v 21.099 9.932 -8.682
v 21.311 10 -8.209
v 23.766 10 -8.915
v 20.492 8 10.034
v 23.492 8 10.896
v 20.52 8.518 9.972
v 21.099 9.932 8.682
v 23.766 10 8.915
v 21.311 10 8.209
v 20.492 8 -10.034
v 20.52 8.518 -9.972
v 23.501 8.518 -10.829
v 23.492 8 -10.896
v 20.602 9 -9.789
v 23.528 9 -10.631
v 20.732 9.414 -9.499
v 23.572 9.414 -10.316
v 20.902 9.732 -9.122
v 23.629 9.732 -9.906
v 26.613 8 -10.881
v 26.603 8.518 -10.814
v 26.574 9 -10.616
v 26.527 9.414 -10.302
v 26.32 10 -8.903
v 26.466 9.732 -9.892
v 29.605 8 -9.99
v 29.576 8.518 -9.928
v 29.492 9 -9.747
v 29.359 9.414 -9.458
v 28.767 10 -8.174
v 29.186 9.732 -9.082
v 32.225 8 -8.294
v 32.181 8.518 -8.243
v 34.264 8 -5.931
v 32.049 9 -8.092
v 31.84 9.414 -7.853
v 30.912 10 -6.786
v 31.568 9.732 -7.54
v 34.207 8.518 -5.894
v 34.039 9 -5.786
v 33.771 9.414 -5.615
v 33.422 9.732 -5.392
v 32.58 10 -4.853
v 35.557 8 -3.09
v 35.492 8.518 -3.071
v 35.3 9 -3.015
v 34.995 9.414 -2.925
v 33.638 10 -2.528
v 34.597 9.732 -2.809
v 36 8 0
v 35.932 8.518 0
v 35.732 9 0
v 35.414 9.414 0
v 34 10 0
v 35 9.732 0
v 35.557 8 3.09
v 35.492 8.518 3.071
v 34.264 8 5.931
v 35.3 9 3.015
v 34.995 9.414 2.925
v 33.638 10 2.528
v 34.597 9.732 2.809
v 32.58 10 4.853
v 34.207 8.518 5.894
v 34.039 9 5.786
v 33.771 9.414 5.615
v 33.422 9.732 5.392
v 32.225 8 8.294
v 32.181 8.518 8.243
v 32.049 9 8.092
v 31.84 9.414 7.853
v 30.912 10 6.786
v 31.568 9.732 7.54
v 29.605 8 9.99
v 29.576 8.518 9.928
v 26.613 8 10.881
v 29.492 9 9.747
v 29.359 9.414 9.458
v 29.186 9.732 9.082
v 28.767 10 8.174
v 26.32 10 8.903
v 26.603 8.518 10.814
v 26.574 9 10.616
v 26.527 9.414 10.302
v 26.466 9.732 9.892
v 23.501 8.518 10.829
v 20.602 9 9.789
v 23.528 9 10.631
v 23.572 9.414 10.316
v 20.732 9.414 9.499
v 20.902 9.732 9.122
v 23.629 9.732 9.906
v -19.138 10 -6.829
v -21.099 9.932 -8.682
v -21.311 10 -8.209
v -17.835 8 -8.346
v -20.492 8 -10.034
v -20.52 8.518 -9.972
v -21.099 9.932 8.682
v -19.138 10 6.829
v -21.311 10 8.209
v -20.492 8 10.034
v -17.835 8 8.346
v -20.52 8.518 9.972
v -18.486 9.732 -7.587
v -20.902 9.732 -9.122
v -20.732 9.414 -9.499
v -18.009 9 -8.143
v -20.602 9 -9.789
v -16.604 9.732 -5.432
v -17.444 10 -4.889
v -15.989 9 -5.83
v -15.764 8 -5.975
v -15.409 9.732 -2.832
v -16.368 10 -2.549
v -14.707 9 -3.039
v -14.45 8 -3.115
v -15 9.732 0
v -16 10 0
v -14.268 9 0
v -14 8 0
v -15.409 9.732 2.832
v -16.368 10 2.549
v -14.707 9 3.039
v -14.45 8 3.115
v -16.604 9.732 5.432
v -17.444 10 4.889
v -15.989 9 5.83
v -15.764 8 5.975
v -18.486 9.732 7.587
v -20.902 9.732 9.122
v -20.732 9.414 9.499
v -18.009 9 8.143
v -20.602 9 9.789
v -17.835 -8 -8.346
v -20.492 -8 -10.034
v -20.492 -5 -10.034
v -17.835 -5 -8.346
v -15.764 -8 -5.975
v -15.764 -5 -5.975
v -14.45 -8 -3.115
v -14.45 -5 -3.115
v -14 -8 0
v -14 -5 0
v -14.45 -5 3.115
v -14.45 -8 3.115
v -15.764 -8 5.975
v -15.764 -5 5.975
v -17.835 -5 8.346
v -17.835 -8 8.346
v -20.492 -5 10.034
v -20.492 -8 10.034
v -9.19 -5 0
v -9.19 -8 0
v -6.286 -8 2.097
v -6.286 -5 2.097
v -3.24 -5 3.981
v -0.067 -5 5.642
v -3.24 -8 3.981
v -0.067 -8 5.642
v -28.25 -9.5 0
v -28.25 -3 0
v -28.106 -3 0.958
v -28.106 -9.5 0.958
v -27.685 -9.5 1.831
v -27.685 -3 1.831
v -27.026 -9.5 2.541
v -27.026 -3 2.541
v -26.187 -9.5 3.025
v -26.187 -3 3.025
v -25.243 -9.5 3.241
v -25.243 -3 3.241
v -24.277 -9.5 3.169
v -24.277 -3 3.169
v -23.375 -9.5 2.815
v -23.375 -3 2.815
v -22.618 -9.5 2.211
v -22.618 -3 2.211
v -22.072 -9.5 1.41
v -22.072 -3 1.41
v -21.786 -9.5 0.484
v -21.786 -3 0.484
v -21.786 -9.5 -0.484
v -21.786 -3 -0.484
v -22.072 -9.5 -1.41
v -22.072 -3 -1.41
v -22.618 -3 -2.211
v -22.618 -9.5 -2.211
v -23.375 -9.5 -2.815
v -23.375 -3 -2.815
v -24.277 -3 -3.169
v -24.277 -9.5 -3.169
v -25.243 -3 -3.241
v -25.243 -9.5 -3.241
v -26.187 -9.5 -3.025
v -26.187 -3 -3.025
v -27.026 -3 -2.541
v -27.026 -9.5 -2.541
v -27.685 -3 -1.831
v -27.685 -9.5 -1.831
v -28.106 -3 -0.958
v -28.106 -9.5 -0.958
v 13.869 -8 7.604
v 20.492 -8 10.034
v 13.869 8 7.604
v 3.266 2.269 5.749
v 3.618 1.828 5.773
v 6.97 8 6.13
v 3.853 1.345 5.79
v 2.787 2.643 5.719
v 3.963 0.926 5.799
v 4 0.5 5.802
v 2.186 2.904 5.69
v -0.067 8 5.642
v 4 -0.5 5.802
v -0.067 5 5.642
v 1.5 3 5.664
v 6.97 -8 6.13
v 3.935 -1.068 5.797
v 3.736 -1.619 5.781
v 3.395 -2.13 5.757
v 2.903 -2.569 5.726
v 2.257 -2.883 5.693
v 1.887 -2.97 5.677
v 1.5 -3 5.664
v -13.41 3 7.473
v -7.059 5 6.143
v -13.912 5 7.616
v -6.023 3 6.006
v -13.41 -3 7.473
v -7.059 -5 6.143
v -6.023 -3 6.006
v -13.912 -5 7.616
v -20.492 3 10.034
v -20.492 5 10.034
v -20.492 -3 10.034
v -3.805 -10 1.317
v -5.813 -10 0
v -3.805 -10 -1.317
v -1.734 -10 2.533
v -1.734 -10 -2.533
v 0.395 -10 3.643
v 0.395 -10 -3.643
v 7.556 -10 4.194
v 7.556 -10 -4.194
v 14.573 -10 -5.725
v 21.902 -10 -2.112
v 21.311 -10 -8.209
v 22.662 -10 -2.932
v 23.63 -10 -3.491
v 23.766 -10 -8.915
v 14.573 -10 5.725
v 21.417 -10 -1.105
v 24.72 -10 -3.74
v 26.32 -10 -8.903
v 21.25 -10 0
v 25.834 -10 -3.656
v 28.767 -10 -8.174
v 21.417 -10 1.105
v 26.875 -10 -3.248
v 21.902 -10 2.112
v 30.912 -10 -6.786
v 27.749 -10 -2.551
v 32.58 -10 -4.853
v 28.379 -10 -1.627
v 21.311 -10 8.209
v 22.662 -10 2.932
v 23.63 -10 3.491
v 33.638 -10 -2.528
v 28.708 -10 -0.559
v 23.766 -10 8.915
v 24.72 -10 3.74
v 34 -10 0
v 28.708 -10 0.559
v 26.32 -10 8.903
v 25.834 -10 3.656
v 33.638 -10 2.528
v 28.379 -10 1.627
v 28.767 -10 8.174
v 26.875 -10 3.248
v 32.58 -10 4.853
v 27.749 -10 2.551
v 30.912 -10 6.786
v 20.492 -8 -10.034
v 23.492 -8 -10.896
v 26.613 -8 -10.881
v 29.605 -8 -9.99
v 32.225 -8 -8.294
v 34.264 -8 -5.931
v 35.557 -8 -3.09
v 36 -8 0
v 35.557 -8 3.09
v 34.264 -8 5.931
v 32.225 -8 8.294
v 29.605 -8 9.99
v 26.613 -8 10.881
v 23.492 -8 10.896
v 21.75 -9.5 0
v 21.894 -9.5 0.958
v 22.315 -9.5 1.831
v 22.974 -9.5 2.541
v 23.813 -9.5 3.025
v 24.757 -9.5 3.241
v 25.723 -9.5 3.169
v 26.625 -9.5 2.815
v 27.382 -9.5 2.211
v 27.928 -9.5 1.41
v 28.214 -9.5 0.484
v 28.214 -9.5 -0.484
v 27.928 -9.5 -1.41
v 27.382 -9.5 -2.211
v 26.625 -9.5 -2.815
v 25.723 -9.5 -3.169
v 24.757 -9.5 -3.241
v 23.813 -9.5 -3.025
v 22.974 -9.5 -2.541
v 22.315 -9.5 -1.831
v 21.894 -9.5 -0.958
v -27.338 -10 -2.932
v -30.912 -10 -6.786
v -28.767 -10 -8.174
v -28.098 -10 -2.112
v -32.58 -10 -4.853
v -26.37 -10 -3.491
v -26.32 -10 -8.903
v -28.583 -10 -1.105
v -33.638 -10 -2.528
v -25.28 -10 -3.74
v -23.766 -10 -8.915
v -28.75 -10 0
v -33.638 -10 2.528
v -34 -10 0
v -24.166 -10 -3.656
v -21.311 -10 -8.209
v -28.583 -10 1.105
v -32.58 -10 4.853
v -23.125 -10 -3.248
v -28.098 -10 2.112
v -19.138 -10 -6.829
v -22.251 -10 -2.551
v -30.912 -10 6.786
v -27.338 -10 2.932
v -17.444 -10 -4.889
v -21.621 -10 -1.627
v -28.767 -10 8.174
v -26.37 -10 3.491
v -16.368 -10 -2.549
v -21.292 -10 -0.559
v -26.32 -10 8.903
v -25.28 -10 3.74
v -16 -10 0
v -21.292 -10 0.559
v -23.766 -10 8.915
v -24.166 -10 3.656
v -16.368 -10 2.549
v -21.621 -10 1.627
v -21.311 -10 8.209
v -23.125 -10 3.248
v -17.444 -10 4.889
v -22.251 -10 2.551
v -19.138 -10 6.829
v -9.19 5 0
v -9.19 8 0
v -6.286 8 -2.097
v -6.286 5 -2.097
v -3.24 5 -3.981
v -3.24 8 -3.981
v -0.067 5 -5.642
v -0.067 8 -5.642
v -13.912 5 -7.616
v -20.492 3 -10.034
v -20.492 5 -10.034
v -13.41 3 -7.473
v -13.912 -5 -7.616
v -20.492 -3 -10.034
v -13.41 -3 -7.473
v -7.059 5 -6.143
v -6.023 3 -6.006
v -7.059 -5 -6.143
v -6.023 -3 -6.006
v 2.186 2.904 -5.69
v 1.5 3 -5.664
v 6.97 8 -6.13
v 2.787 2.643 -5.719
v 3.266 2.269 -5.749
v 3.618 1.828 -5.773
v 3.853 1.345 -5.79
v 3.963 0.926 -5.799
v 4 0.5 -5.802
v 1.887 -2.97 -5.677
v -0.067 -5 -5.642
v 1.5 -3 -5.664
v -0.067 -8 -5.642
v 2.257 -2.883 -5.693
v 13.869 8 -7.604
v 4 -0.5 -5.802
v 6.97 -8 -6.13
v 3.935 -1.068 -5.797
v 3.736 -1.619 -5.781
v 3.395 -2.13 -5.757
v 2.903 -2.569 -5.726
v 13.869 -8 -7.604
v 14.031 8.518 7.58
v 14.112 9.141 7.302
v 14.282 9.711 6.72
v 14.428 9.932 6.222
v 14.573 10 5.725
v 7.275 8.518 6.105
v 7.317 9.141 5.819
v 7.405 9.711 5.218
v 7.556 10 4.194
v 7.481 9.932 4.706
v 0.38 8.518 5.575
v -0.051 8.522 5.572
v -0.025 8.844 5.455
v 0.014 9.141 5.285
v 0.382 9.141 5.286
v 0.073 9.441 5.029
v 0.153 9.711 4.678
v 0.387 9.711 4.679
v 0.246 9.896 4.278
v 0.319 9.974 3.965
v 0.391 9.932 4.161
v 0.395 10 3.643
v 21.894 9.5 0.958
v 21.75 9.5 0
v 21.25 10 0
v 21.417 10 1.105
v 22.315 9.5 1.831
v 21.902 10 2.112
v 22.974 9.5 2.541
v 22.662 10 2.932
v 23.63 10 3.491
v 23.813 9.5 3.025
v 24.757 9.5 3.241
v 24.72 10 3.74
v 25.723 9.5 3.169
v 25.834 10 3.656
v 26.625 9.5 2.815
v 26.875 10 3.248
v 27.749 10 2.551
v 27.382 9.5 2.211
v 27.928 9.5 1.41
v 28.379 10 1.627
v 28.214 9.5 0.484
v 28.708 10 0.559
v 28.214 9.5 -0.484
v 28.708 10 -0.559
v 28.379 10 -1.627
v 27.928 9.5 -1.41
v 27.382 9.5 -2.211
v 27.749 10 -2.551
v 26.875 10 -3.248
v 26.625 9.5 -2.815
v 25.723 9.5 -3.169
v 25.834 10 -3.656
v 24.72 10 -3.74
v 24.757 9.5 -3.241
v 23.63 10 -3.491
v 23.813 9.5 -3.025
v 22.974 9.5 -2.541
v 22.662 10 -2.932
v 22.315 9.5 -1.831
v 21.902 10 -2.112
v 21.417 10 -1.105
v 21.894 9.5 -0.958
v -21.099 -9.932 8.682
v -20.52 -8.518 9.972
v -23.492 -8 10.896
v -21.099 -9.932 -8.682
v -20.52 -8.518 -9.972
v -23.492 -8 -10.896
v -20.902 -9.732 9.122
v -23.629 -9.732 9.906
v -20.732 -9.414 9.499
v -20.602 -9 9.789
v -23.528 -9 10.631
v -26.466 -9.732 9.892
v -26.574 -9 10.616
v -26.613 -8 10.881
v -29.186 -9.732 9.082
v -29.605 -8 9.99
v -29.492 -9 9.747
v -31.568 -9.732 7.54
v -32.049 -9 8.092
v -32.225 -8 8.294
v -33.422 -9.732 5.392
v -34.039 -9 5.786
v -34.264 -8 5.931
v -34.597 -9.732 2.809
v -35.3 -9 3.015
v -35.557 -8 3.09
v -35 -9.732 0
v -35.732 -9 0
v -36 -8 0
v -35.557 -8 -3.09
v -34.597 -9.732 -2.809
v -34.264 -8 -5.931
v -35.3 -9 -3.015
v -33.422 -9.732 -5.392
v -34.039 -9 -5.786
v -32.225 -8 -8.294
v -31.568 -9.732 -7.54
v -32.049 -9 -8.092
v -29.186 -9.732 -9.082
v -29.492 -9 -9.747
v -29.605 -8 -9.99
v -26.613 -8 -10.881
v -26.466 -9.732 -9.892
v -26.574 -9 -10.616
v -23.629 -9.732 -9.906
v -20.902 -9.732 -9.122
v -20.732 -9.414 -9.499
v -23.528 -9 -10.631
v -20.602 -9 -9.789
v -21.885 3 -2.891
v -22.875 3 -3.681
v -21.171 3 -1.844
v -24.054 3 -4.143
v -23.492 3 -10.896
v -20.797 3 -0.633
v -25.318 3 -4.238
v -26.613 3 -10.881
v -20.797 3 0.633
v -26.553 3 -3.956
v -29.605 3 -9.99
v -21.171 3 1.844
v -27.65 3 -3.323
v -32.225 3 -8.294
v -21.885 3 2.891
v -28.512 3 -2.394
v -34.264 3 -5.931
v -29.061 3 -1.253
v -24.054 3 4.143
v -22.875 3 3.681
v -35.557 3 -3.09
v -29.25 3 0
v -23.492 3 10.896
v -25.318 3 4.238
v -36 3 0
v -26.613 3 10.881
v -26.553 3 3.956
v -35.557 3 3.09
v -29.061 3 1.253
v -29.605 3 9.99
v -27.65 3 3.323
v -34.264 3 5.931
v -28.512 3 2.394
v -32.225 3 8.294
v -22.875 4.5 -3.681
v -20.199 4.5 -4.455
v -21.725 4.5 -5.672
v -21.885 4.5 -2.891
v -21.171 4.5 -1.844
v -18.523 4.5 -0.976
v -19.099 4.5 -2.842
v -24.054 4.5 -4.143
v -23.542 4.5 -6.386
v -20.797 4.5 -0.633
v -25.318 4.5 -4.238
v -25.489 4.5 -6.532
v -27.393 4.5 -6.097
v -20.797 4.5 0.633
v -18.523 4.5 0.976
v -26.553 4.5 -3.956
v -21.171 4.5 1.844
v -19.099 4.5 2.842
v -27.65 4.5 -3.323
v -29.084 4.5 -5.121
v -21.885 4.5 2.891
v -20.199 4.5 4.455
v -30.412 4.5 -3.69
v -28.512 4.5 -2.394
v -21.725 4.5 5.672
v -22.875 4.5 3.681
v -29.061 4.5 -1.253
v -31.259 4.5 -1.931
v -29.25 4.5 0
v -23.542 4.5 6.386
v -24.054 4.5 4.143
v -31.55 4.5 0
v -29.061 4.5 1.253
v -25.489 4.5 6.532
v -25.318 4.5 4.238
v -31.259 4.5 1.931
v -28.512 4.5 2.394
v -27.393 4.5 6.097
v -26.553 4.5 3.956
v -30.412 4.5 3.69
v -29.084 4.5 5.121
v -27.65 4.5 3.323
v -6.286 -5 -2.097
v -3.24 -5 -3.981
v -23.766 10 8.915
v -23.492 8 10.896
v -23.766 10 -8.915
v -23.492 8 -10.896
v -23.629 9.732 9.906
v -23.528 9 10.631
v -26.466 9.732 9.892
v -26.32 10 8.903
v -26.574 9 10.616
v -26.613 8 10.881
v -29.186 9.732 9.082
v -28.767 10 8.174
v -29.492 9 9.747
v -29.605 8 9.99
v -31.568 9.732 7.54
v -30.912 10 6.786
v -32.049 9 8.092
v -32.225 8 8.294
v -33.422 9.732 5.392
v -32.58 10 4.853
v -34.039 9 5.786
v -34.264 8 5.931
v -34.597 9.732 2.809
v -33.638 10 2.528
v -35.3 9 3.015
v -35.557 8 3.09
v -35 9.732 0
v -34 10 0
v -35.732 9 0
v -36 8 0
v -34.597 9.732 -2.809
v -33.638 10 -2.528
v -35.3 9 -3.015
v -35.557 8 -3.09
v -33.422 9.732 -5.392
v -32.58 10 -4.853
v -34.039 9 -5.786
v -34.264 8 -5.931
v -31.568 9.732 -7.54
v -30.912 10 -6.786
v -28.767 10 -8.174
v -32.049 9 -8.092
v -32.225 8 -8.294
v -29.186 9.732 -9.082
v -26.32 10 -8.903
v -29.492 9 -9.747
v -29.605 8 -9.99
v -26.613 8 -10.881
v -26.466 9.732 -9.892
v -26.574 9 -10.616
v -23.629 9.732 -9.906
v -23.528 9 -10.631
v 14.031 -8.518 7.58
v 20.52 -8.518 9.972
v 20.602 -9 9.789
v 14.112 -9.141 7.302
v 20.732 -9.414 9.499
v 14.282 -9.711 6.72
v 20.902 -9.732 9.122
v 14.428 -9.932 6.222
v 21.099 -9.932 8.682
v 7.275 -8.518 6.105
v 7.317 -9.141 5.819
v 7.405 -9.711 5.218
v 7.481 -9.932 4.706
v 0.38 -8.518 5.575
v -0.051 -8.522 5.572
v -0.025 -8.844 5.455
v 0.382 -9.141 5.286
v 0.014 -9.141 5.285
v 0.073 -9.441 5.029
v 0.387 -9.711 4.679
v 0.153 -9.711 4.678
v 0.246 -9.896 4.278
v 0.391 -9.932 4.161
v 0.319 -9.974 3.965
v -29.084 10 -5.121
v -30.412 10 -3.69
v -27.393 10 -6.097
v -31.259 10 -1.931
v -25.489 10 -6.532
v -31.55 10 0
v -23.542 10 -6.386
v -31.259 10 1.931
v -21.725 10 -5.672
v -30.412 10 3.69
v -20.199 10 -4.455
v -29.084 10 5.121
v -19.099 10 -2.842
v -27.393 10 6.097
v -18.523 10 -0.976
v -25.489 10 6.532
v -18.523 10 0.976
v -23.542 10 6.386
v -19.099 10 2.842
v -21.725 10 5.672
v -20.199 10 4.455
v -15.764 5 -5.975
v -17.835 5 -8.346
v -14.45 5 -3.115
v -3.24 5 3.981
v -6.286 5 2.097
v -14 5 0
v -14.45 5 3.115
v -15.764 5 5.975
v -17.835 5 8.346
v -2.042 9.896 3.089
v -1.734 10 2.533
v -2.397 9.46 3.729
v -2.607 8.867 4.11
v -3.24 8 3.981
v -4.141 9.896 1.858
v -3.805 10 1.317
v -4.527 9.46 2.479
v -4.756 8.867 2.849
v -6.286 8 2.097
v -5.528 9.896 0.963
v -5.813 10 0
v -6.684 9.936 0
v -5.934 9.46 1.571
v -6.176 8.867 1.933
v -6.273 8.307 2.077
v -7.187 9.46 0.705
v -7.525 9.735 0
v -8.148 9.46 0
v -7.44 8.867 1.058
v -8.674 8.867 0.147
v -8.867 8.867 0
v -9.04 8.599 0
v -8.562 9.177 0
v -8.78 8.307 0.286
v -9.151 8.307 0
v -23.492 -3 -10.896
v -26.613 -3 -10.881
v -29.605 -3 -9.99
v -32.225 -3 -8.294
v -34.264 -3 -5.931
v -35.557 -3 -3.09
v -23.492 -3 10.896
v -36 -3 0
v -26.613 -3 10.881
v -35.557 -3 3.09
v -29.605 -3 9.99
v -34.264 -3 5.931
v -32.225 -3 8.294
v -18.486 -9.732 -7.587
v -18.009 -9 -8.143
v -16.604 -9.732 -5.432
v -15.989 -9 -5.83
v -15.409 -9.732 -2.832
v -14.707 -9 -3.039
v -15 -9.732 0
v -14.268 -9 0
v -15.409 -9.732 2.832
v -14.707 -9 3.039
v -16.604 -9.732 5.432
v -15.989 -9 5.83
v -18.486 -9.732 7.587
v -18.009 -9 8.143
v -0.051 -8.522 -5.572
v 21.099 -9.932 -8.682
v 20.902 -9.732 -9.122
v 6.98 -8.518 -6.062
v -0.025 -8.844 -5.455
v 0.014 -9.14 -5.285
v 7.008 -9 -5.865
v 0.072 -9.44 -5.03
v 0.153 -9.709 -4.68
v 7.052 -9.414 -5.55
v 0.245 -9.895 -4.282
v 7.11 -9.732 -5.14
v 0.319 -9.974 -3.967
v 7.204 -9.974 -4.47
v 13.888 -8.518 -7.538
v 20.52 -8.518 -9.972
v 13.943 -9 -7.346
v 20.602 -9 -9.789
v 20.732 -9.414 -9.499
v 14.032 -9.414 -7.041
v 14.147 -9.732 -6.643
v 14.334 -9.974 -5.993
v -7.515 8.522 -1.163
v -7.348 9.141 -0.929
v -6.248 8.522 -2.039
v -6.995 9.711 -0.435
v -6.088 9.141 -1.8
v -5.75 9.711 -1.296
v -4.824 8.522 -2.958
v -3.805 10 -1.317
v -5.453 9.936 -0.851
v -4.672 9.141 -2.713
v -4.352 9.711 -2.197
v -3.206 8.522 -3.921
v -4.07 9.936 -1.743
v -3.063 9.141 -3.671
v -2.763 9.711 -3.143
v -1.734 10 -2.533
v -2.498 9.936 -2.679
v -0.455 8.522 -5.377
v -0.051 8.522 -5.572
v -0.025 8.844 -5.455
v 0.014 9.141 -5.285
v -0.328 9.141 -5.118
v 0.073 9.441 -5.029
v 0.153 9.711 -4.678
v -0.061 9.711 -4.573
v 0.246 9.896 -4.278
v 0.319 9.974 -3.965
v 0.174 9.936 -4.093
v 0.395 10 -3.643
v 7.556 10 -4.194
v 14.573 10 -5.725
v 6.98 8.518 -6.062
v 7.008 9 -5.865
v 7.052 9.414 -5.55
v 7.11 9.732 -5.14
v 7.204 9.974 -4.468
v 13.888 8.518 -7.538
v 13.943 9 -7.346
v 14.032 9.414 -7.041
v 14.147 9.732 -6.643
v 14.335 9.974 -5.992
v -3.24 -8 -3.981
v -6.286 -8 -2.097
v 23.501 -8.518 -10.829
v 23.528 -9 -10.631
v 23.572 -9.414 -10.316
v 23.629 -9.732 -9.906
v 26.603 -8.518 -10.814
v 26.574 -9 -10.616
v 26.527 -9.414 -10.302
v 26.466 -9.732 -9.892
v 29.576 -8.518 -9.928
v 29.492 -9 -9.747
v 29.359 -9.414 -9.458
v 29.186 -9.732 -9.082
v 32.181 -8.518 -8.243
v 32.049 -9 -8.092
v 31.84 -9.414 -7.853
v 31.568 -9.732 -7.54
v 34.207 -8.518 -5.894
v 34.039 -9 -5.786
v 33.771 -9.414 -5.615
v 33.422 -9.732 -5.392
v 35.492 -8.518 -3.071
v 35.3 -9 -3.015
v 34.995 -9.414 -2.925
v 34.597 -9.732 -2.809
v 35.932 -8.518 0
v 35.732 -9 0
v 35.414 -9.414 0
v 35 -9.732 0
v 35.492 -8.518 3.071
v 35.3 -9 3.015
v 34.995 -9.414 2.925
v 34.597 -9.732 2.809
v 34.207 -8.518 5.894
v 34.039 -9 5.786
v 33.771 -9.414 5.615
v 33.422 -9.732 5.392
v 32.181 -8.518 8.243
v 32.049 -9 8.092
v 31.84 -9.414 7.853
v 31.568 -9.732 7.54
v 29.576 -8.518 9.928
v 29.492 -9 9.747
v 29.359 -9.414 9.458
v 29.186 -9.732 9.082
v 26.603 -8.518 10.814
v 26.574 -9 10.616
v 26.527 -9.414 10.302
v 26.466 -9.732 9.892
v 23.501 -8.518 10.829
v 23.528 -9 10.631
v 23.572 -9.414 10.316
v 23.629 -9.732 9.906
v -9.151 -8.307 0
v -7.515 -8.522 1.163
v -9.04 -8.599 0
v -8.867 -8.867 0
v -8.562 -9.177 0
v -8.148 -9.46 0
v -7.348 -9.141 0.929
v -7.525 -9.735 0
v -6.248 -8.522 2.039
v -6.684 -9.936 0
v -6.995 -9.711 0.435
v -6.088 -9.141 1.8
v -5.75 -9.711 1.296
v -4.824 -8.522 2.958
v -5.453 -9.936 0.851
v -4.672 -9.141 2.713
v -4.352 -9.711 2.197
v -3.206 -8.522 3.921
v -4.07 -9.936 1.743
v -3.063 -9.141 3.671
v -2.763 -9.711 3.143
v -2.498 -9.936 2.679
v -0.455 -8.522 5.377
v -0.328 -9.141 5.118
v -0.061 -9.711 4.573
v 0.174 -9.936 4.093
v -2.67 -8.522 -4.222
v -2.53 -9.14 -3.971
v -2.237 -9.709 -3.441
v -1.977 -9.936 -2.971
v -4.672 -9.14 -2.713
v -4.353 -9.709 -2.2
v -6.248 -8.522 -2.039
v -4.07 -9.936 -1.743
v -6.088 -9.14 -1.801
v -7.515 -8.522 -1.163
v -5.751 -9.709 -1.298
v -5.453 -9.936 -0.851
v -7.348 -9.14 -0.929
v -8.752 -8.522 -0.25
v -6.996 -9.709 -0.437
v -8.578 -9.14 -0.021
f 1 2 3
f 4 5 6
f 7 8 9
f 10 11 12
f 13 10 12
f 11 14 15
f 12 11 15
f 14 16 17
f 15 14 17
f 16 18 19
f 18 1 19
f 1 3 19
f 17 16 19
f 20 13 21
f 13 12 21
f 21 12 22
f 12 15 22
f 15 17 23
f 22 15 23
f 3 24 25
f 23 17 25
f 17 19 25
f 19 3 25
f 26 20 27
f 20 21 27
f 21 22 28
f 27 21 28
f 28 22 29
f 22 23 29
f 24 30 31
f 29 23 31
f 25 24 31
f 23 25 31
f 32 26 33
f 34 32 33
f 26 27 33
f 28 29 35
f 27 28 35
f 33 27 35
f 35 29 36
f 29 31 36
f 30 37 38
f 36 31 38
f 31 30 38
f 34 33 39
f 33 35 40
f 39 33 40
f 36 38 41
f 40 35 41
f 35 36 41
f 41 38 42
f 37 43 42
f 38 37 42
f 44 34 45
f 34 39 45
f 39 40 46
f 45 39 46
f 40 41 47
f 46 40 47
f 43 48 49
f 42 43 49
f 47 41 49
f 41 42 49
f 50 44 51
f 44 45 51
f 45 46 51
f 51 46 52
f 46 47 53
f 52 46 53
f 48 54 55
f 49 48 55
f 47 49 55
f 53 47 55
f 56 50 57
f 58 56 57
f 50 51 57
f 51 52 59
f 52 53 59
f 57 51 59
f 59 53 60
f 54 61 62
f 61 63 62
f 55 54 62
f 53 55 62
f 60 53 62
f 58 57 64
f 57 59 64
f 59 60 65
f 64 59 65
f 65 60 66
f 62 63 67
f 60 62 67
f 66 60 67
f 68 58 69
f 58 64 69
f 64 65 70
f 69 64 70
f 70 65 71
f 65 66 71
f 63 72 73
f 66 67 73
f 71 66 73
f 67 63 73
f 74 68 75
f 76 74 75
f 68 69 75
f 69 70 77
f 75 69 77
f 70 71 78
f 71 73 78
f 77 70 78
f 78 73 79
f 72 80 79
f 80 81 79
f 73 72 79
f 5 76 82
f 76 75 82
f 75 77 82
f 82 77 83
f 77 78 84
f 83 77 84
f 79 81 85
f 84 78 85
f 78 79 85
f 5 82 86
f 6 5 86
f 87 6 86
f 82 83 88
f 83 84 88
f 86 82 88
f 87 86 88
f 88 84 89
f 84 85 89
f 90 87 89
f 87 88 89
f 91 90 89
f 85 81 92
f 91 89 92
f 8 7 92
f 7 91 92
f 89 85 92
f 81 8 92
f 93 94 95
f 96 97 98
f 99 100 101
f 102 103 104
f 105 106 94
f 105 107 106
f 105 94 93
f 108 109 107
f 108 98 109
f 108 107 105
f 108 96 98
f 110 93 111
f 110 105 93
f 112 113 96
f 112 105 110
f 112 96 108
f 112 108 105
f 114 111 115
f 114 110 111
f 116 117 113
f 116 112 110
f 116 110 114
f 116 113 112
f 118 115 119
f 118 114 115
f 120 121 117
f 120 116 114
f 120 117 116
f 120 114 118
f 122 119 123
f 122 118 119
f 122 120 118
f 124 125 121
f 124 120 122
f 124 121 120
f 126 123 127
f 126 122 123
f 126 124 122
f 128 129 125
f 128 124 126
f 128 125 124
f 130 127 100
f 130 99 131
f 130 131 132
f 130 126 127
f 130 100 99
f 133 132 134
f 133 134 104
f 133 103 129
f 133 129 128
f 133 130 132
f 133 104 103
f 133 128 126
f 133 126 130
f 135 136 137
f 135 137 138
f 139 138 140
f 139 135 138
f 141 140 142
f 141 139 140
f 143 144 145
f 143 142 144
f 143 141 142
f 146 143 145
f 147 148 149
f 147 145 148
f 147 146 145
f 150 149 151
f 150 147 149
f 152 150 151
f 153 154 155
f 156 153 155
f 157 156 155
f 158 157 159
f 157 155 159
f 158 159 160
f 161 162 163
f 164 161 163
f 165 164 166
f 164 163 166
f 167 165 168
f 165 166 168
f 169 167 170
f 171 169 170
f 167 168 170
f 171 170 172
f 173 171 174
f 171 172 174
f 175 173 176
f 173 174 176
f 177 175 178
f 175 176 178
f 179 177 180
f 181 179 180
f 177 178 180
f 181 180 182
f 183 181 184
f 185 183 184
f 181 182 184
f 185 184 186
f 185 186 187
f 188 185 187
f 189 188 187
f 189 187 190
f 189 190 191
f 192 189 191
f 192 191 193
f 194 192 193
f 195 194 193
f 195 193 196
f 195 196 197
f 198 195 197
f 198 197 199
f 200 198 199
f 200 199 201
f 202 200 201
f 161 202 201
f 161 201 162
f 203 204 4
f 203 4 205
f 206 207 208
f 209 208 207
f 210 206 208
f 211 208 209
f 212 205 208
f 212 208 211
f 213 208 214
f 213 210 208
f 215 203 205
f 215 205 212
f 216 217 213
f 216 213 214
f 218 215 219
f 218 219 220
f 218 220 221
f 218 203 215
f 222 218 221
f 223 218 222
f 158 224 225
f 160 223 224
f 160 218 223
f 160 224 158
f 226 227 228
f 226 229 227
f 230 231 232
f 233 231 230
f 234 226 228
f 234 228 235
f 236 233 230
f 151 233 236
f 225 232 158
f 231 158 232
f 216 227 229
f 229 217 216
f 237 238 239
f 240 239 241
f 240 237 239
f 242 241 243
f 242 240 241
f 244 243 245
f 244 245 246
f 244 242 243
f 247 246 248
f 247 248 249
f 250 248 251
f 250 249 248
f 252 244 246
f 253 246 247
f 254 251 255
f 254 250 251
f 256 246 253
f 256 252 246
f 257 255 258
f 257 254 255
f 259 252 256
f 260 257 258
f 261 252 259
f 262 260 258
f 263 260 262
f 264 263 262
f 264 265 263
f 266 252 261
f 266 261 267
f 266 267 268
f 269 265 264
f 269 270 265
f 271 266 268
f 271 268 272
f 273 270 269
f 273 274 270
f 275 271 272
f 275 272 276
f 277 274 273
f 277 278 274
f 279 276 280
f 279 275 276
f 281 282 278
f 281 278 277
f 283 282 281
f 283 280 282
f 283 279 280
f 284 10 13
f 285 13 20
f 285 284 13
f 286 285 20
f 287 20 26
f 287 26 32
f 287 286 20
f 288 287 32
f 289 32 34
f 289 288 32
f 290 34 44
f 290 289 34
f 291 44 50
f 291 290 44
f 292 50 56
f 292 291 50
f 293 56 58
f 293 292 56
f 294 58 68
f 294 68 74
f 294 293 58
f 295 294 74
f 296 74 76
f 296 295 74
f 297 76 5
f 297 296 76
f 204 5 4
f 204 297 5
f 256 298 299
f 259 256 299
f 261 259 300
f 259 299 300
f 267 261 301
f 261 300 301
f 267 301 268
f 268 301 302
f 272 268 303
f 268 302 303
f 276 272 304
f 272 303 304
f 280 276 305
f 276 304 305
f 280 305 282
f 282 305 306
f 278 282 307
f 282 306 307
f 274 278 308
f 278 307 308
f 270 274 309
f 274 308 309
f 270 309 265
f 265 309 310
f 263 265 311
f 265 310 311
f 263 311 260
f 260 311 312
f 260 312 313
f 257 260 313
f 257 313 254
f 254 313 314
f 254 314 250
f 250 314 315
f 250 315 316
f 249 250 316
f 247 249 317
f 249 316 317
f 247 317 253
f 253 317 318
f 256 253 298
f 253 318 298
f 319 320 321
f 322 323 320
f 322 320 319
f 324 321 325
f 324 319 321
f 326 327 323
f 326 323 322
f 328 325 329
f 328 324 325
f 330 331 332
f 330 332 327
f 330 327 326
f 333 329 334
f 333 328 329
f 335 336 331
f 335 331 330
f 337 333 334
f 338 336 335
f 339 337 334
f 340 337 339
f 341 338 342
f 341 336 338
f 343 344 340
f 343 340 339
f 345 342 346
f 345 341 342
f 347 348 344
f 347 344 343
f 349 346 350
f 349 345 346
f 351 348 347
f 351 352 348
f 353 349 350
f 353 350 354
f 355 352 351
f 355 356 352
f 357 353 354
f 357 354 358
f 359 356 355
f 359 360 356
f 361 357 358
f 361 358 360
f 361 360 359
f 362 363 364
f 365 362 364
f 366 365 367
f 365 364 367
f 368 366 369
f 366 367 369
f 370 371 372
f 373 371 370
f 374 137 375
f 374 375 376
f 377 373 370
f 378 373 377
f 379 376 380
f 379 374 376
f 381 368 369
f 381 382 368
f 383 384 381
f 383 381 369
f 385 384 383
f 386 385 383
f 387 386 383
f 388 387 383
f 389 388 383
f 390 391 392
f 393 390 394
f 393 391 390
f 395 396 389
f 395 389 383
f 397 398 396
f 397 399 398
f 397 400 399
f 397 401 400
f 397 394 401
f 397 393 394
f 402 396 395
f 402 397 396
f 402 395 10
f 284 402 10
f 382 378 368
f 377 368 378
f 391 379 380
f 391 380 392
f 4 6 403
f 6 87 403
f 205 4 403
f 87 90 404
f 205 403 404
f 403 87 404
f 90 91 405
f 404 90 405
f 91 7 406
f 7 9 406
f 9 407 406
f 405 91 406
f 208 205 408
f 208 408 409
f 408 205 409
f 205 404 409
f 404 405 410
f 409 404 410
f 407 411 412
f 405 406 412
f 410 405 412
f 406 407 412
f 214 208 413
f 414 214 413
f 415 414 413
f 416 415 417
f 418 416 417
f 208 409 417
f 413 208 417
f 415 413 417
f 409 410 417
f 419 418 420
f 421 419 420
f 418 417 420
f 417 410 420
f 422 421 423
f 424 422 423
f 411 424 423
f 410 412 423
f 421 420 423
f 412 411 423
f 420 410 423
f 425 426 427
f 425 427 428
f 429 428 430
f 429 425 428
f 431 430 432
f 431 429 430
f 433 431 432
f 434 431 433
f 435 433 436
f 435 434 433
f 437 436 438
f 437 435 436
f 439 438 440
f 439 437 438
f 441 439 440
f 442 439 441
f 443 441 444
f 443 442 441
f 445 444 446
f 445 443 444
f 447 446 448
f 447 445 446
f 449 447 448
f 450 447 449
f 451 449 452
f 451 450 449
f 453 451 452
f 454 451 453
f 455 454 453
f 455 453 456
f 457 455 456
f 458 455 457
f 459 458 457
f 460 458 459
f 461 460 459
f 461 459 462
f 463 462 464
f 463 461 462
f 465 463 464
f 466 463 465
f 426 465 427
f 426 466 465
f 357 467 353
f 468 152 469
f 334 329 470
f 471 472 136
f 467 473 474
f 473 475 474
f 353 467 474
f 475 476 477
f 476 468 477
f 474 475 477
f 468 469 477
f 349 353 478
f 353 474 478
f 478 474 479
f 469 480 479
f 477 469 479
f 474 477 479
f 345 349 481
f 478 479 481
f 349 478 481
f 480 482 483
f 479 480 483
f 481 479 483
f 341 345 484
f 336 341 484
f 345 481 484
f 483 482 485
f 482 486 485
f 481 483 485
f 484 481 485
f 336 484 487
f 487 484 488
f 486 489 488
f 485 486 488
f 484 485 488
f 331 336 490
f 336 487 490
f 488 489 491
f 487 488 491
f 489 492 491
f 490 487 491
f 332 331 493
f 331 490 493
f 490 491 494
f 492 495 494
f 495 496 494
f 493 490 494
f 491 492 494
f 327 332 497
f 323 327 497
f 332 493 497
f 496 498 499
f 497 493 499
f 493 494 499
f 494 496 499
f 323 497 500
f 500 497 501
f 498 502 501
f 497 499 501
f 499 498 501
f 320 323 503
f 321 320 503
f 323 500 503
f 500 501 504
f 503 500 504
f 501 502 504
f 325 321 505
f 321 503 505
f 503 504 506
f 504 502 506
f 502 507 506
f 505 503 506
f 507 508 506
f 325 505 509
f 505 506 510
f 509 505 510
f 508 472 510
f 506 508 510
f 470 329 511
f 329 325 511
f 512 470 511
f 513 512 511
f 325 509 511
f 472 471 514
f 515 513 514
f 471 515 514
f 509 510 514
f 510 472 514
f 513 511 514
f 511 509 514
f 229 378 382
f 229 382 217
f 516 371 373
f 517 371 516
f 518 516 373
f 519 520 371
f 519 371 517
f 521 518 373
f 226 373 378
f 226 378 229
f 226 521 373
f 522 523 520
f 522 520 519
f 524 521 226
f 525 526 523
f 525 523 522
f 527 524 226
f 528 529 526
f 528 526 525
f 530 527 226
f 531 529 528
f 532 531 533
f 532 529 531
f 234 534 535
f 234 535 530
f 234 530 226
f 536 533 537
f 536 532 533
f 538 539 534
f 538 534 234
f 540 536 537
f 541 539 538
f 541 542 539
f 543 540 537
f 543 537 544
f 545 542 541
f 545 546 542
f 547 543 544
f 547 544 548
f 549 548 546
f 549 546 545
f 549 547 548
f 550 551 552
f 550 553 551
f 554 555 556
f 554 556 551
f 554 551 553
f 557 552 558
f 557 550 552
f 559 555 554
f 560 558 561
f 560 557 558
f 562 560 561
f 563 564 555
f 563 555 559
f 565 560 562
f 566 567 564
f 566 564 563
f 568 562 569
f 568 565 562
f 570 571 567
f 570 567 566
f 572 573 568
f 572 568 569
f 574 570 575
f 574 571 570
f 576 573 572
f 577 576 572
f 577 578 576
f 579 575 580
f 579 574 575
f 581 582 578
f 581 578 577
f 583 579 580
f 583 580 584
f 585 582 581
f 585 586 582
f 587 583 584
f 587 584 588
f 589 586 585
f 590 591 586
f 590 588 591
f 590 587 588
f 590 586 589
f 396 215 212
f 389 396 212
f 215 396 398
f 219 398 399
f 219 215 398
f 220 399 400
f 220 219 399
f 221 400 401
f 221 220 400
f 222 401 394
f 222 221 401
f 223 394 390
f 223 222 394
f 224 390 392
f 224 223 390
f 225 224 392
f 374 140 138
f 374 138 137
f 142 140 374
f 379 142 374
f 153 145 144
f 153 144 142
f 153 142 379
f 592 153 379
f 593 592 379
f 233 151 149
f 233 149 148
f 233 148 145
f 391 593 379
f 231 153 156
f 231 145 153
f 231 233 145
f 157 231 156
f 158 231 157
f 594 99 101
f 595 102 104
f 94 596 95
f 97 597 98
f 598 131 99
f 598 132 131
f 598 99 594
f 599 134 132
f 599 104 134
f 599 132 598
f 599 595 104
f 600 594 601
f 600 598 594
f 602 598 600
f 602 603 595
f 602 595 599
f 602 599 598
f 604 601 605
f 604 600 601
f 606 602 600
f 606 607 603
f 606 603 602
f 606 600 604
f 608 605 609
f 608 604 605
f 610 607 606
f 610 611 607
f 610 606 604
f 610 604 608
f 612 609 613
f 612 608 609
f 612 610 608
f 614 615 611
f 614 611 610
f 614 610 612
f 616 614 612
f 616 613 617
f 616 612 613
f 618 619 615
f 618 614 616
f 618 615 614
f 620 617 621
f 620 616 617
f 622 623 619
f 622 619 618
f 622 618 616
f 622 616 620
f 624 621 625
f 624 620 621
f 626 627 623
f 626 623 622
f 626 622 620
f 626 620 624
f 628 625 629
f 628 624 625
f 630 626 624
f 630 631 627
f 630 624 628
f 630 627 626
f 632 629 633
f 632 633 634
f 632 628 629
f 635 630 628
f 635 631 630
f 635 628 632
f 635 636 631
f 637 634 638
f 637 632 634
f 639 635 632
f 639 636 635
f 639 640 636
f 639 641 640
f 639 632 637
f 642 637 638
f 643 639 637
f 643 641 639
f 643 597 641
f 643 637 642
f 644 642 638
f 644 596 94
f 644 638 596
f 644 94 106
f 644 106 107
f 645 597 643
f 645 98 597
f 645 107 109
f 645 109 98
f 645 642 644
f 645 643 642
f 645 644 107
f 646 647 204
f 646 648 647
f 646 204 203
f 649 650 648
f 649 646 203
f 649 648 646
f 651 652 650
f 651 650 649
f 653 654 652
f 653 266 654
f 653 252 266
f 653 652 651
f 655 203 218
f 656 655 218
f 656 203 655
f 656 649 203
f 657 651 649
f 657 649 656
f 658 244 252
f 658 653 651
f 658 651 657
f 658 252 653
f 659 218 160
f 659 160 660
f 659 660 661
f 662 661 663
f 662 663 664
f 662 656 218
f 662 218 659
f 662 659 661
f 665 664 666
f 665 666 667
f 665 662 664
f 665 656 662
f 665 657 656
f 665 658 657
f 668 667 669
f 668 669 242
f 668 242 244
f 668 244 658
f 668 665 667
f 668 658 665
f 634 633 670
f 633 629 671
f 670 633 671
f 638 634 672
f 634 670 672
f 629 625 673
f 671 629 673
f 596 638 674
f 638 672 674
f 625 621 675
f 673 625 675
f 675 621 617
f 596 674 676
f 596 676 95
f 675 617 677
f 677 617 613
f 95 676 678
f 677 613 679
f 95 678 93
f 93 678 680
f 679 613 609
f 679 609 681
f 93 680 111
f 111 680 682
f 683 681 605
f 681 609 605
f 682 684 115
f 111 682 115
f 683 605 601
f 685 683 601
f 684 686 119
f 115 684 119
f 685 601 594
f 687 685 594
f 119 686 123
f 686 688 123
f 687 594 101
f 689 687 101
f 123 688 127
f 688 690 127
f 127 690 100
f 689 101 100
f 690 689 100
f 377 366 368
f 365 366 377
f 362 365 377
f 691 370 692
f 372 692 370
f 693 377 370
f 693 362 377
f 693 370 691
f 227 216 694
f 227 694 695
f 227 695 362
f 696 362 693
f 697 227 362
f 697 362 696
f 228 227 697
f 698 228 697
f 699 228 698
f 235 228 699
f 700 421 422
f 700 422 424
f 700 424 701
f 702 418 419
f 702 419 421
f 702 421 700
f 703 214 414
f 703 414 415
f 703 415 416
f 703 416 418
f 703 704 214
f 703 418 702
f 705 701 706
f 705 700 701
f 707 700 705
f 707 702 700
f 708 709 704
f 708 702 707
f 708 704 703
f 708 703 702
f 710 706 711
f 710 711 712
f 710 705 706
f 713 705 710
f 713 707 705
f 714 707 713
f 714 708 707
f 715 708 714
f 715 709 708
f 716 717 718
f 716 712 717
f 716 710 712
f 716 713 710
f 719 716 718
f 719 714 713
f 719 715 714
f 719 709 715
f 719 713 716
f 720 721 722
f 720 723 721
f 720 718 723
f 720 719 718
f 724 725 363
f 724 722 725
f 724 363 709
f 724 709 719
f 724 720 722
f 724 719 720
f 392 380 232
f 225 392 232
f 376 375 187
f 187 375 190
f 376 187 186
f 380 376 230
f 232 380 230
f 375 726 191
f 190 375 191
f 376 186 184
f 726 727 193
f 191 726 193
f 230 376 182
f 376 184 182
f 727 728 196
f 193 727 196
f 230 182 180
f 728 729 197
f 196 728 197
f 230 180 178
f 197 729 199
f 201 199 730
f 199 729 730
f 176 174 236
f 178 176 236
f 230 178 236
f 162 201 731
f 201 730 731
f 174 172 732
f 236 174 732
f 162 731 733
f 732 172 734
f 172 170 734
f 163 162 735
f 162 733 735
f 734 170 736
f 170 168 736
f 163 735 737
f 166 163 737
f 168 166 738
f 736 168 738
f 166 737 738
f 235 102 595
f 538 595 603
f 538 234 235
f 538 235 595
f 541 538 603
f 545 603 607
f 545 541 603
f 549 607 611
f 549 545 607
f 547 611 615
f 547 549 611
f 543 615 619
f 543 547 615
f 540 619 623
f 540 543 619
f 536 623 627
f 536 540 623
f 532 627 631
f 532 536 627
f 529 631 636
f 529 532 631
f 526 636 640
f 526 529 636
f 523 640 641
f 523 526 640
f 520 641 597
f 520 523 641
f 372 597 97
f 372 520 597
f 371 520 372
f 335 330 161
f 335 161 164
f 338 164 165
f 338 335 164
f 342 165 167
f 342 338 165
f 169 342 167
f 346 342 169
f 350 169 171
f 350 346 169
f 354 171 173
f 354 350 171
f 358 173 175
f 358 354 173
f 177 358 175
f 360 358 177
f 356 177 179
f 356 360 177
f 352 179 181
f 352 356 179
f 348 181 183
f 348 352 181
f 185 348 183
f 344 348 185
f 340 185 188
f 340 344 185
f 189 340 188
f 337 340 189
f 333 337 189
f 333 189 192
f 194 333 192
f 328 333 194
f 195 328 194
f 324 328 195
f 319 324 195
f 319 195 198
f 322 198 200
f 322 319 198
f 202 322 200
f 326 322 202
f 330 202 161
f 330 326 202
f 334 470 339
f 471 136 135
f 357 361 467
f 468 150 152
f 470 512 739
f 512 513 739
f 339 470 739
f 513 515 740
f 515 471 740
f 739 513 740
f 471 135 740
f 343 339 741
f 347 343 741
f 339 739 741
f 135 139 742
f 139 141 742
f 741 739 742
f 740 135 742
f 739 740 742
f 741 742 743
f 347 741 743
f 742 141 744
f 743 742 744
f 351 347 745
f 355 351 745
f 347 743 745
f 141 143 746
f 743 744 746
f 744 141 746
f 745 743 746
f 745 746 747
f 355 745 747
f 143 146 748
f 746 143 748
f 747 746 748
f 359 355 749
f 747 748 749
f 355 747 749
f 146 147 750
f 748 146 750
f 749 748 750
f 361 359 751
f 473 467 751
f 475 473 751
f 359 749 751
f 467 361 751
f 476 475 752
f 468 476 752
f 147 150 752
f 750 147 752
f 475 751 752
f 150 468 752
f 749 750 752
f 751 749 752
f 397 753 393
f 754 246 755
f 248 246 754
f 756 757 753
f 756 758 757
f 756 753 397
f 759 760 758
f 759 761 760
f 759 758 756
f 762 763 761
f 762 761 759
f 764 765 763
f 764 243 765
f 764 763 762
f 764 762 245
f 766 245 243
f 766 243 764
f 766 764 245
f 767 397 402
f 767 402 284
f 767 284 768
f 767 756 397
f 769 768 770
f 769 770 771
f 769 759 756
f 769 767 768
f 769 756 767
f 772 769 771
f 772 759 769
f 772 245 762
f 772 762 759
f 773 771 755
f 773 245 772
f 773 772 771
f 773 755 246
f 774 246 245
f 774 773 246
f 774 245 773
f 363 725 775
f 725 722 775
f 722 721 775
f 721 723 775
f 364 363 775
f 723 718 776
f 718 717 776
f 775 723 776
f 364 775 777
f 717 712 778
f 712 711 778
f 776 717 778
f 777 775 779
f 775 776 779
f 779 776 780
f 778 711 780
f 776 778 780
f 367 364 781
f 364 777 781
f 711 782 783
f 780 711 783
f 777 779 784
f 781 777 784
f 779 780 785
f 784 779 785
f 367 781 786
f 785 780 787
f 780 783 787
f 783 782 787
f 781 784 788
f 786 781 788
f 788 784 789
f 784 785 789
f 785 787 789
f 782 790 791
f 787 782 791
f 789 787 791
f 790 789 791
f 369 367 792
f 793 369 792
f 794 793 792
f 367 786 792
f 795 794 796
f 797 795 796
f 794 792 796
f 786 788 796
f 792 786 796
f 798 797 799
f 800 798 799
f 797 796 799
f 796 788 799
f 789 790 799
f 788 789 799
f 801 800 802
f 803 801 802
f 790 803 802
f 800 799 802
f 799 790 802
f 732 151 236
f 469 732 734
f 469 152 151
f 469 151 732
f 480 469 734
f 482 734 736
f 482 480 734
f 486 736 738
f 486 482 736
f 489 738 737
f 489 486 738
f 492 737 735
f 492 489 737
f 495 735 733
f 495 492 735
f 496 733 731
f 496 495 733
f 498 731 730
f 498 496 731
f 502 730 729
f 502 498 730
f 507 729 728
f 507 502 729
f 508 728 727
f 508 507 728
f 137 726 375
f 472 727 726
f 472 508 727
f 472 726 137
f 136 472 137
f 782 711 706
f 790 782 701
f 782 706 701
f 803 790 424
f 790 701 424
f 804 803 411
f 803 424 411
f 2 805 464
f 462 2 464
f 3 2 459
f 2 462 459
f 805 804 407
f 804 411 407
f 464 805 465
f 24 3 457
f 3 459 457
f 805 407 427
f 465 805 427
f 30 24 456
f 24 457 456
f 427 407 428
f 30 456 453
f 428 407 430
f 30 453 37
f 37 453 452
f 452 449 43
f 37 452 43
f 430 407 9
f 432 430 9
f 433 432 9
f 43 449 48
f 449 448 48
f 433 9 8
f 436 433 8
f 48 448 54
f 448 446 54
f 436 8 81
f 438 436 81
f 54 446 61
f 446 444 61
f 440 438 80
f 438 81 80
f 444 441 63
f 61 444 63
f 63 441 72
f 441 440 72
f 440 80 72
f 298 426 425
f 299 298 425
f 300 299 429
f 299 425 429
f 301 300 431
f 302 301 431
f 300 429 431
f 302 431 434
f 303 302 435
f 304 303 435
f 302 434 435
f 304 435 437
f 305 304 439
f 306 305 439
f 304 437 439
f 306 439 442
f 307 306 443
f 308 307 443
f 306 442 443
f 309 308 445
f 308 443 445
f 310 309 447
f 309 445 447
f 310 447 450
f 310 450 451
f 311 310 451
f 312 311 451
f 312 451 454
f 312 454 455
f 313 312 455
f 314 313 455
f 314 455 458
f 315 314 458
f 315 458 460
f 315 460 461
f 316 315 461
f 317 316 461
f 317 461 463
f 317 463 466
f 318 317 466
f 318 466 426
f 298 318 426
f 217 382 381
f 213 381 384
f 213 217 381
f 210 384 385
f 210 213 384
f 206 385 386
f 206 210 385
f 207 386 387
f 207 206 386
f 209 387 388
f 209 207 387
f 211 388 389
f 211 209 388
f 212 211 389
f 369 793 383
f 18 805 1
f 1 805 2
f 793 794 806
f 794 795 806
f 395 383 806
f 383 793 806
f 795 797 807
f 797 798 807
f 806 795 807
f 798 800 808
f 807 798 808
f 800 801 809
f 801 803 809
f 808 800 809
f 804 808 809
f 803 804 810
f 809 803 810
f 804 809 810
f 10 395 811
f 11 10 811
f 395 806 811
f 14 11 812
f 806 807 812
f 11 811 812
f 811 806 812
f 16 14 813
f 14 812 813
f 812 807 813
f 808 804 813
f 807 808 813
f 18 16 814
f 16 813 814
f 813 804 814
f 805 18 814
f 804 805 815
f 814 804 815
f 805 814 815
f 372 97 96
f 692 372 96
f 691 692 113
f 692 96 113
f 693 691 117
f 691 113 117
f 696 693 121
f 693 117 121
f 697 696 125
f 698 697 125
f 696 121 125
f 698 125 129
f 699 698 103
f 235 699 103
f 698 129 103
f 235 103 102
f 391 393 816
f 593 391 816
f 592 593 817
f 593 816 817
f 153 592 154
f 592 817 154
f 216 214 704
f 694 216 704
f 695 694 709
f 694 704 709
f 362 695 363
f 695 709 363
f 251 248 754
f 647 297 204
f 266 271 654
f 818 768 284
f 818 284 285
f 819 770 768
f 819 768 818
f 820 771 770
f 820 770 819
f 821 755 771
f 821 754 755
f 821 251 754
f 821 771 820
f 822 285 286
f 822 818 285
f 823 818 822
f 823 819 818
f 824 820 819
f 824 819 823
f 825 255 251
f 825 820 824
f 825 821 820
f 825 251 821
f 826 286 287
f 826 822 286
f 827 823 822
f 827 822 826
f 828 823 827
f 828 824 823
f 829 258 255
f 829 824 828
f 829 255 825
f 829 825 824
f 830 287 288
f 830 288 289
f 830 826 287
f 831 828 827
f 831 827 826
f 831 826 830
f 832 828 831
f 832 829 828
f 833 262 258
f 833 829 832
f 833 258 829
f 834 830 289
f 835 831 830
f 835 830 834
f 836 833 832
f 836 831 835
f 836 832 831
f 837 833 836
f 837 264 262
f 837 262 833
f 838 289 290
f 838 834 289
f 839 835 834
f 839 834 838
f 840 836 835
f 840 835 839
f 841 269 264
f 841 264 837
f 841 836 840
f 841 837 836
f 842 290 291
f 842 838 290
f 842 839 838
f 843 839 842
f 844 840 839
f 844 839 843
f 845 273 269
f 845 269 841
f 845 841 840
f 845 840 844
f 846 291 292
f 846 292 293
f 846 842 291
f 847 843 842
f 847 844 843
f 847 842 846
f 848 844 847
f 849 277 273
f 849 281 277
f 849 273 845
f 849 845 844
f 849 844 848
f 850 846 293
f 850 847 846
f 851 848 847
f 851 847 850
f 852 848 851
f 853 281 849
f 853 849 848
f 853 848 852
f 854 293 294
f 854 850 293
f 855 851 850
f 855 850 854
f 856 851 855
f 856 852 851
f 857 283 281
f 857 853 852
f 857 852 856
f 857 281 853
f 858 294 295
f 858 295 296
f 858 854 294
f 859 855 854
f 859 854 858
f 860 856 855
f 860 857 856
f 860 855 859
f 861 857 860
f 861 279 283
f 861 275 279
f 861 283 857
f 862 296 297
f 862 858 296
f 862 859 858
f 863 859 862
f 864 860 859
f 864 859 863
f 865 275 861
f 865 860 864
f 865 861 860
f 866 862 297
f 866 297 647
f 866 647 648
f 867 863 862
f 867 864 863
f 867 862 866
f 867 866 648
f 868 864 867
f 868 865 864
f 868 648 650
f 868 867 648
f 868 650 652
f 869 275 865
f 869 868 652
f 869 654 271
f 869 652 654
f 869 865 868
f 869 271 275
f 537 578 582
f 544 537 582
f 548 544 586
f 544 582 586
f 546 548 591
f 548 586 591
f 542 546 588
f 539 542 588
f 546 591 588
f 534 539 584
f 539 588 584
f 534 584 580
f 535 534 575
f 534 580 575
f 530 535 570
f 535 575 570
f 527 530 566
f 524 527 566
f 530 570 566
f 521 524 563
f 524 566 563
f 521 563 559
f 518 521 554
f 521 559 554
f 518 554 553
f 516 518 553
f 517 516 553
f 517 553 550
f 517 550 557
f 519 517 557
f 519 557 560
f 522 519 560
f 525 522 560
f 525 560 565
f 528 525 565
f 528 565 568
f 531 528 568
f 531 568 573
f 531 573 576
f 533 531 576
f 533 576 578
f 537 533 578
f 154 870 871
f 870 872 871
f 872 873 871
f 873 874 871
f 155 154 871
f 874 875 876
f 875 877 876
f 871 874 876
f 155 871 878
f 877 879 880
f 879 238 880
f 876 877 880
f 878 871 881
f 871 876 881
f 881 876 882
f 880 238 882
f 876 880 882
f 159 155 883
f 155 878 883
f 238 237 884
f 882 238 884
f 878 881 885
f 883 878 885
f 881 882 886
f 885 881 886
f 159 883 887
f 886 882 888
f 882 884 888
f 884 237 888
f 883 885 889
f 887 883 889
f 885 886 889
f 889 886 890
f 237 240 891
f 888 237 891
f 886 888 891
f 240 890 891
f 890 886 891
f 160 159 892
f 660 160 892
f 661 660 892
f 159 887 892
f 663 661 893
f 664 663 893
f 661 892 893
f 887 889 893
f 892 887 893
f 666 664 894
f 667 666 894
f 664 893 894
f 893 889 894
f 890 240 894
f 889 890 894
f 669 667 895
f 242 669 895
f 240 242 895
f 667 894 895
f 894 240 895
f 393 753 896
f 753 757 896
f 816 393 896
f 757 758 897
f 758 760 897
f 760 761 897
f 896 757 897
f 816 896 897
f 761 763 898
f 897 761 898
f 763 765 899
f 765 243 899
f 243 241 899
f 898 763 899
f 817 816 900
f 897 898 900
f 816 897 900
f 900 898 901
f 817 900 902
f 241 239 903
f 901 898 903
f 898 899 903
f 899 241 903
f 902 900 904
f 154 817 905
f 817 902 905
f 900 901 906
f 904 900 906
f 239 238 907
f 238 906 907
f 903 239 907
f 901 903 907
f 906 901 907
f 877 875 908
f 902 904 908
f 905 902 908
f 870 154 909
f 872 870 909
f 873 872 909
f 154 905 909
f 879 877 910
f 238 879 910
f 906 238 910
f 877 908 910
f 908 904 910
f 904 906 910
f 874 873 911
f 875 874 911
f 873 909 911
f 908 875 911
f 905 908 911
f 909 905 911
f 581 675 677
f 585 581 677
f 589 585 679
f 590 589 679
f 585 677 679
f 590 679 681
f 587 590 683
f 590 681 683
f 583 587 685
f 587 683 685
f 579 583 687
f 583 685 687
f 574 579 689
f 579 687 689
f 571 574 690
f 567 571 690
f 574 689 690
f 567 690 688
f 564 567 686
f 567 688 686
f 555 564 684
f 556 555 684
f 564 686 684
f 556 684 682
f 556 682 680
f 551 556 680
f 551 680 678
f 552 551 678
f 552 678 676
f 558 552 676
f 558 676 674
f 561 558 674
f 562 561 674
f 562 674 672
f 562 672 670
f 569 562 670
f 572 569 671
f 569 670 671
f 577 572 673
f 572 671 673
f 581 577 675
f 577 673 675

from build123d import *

# Parameters (mm, degrees)
F1_DEPTH  = 10
F3_R      = 3.25
F4_DEPTH  = 20.001
F2_R      = 4.25
F5_DEPTH  = 9
F6_R      = 6.55
F6_R_2    = 4.25
F7_DEPTH  = 5.5
F8_R      = 11
F9_DEPTH  = 5
F11_DEPTH = 5
F12_R     = 2
F14_W     = 6
F14_H     = 30
F15_DEPTH = 40
F16_R     = 2.5
F17_SIZE  = 0.5


with BuildPart() as f1:
    # F0 (on Front) → F1 (new body, symmetric)
    with BuildSketch(Plane.XZ):
        with BuildLine():
            ThreePointArc((20.4918032787, 10.0337511591), (0, 5.641710973), (-20.4918032787, 10.0337511591))
            ThreePointArc((-20.4918032787, 10.0337511591), (-36, 0), (-20.4918032787, -10.0337511591))
            ThreePointArc((-20.4918032787, -10.0337511591), (0, -5.641710973), (20.4918032787, -10.0337511591))
            ThreePointArc((20.4918032787, -10.0337511591), (36, 0), (20.4918032787, 10.0337511591))
        make_face()
    extrude(amount=F1_DEPTH, both=True)

    # F3 (on face) → F4 (cut, through all)
    with BuildSketch(Plane(origin=(0, 10, 0), x_dir=(-1, 0, 0), z_dir=(0, 1, 0))):
        with Locations((-25, 0)):
            Circle(F3_R)
        with Locations((25, 0)):
            Circle(F3_R)
    extrude(amount=-F4_DEPTH, mode=Mode.SUBTRACT)

    # F2 (on face) → F5 (cut)
    with BuildSketch(Plane(origin=(0, 10, 0), x_dir=(-1, 0, 0), z_dir=(0, 1, 0))):
        with Locations((25, 0)):
            Circle(F2_R)
    extrude(amount=-F5_DEPTH, mode=Mode.SUBTRACT)

    # F6 (on face) → F7 (cut)
    with BuildSketch(Plane(origin=(0, 10, 0), x_dir=(-1, 0, 0), z_dir=(0, 1, 0))):
        with Locations((25, 0)):
            Circle(F6_R)
        with Locations((25, 0)):
            Circle(F6_R_2, mode=Mode.SUBTRACT)
    extrude(amount=-F7_DEPTH, mode=Mode.SUBTRACT)

    # F8 (on face) → F9 (cut)
    with BuildSketch(Plane.XZ.offset(10)):
        with BuildLine():
            ThreePointArc((5.6538687387, -7.9576025909), (-2.1053254823, -4.6082797346), (-9.1895908953, 0))
            ThreePointArc((-9.1895908953, 0), (-2.1053254823, 4.6082797346), (5.6538687387, 7.9576025909))
            Line((5.6538687387, 7.9576025909), (-41.2745177746, 16.0983856767))
            Line((-41.2745177746, 16.0983856767), (-41.2745177746, 0))
            Line((-41.2745177746, 0), (-41.2745177746, -16.0983856767))
            Line((-41.2745177746, -16.0983856767), (5.6538687387, -7.9576025909))
        make_face()
        with Locations((-25, 0)):
            Circle(F8_R, mode=Mode.SUBTRACT)
    extrude(amount=-F9_DEPTH, mode=Mode.SUBTRACT)

    # F10 (on face) → F11 (cut)
    with BuildSketch(Plane(origin=(0, 10, 0), x_dir=(-1, 0, 0), z_dir=(0, 1, 0))):
        with BuildLine():
            Line((-5.6538687387, -7.9576025909), (41.2745177746, -16.0983856767))
            Line((41.2745177746, -16.0983856767), (41.2745177746, 0))
            Line((41.2745177746, 0), (41.2745177746, 16.0983856767))
            Line((41.2745177746, 16.0983856767), (-5.6538687387, 7.9576025909))
            ThreePointArc((-5.6538687387, 7.9576025909), (-2.7576543334, 6.8880347996), (0.0670265411, 5.6417558986))
            ThreePointArc((0.0670265411, 5.6417558986), (10.5113641589, 6.7590839617), (20.4918032787, 10.0337511591))
            ThreePointArc((20.4918032787, 10.0337511591), (30.9753592388, 9.235533659), (36, 0))
            ThreePointArc((36, 0), (30.9753592388, -9.235533659), (20.4918032787, -10.0337511591))
            ThreePointArc((20.4918032787, -10.0337511591), (10.5113641589, -6.7590839617), (0.0670265411, -5.6417558986))
            ThreePointArc((0.0670265411, -5.6417558986), (-2.7576543334, -6.8880347996), (-5.6538687387, -7.9576025909))
        make_face()
        with BuildLine():
            ThreePointArc((9.1895908953, 0), (4.7800323728, -3.0662109323), (0.0670265411, -5.6417558986))
            ThreePointArc((0.0670265411, -5.6417558986), (10.5113641589, -6.7590839617), (20.4918032787, -10.0337511591))
            ThreePointArc((20.4918032787, -10.0337511591), (14, 0), (20.4918032787, 10.0337511591))
            ThreePointArc((20.4918032787, 10.0337511591), (10.5113641589, 6.7590839617), (0.0670265411, 5.6417558986))
            ThreePointArc((0.0670265411, 5.6417558986), (4.7800323728, 3.0662109323), (9.1895908953, 0))
        make_face()
    extrude(amount=-F11_DEPTH, mode=Mode.SUBTRACT)

    # F12
    f12_edges = [f1.edges().sort_by_distance(p)[0] for p in [
        (-36, -10, 0),
        (-4.780032, -10, -3.066211),
        (-4.780032, -10, 3.066211),
        (10.445826, -10, 6.745037),
        (10.445826, 10, -6.745037),
        (-4.780032, 10, -3.066211),
        (-4.780032, 10, 3.066211),
        (-29.508197, 10, -10.033751),
    ]]
    fillet(f12_edges, radius=F12_R)

    # F14 (on offset) → F15 (cut)
    with BuildSketch(Plane.YZ.offset(-36)):
        Rectangle(F14_W, F14_H)
    extrude(amount=F15_DEPTH, mode=Mode.SUBTRACT)

    # F16
    f16_edges = [f1.edges().sort_by_distance(p)[0] for p in [
        (4, 3, 0),
        (4, -3, 0),
    ]]
    fillet(f16_edges, radius=F16_R)

    # F17
    f17_edges = [f1.edges().sort_by_distance(p)[0] for p in [
        (-21.75, -10, 0),
        (28.25, -10, 0),
        (28.25, 10, 0),
    ]]
    chamfer(f17_edges, length=F17_SIZE)


solid = f1.part
